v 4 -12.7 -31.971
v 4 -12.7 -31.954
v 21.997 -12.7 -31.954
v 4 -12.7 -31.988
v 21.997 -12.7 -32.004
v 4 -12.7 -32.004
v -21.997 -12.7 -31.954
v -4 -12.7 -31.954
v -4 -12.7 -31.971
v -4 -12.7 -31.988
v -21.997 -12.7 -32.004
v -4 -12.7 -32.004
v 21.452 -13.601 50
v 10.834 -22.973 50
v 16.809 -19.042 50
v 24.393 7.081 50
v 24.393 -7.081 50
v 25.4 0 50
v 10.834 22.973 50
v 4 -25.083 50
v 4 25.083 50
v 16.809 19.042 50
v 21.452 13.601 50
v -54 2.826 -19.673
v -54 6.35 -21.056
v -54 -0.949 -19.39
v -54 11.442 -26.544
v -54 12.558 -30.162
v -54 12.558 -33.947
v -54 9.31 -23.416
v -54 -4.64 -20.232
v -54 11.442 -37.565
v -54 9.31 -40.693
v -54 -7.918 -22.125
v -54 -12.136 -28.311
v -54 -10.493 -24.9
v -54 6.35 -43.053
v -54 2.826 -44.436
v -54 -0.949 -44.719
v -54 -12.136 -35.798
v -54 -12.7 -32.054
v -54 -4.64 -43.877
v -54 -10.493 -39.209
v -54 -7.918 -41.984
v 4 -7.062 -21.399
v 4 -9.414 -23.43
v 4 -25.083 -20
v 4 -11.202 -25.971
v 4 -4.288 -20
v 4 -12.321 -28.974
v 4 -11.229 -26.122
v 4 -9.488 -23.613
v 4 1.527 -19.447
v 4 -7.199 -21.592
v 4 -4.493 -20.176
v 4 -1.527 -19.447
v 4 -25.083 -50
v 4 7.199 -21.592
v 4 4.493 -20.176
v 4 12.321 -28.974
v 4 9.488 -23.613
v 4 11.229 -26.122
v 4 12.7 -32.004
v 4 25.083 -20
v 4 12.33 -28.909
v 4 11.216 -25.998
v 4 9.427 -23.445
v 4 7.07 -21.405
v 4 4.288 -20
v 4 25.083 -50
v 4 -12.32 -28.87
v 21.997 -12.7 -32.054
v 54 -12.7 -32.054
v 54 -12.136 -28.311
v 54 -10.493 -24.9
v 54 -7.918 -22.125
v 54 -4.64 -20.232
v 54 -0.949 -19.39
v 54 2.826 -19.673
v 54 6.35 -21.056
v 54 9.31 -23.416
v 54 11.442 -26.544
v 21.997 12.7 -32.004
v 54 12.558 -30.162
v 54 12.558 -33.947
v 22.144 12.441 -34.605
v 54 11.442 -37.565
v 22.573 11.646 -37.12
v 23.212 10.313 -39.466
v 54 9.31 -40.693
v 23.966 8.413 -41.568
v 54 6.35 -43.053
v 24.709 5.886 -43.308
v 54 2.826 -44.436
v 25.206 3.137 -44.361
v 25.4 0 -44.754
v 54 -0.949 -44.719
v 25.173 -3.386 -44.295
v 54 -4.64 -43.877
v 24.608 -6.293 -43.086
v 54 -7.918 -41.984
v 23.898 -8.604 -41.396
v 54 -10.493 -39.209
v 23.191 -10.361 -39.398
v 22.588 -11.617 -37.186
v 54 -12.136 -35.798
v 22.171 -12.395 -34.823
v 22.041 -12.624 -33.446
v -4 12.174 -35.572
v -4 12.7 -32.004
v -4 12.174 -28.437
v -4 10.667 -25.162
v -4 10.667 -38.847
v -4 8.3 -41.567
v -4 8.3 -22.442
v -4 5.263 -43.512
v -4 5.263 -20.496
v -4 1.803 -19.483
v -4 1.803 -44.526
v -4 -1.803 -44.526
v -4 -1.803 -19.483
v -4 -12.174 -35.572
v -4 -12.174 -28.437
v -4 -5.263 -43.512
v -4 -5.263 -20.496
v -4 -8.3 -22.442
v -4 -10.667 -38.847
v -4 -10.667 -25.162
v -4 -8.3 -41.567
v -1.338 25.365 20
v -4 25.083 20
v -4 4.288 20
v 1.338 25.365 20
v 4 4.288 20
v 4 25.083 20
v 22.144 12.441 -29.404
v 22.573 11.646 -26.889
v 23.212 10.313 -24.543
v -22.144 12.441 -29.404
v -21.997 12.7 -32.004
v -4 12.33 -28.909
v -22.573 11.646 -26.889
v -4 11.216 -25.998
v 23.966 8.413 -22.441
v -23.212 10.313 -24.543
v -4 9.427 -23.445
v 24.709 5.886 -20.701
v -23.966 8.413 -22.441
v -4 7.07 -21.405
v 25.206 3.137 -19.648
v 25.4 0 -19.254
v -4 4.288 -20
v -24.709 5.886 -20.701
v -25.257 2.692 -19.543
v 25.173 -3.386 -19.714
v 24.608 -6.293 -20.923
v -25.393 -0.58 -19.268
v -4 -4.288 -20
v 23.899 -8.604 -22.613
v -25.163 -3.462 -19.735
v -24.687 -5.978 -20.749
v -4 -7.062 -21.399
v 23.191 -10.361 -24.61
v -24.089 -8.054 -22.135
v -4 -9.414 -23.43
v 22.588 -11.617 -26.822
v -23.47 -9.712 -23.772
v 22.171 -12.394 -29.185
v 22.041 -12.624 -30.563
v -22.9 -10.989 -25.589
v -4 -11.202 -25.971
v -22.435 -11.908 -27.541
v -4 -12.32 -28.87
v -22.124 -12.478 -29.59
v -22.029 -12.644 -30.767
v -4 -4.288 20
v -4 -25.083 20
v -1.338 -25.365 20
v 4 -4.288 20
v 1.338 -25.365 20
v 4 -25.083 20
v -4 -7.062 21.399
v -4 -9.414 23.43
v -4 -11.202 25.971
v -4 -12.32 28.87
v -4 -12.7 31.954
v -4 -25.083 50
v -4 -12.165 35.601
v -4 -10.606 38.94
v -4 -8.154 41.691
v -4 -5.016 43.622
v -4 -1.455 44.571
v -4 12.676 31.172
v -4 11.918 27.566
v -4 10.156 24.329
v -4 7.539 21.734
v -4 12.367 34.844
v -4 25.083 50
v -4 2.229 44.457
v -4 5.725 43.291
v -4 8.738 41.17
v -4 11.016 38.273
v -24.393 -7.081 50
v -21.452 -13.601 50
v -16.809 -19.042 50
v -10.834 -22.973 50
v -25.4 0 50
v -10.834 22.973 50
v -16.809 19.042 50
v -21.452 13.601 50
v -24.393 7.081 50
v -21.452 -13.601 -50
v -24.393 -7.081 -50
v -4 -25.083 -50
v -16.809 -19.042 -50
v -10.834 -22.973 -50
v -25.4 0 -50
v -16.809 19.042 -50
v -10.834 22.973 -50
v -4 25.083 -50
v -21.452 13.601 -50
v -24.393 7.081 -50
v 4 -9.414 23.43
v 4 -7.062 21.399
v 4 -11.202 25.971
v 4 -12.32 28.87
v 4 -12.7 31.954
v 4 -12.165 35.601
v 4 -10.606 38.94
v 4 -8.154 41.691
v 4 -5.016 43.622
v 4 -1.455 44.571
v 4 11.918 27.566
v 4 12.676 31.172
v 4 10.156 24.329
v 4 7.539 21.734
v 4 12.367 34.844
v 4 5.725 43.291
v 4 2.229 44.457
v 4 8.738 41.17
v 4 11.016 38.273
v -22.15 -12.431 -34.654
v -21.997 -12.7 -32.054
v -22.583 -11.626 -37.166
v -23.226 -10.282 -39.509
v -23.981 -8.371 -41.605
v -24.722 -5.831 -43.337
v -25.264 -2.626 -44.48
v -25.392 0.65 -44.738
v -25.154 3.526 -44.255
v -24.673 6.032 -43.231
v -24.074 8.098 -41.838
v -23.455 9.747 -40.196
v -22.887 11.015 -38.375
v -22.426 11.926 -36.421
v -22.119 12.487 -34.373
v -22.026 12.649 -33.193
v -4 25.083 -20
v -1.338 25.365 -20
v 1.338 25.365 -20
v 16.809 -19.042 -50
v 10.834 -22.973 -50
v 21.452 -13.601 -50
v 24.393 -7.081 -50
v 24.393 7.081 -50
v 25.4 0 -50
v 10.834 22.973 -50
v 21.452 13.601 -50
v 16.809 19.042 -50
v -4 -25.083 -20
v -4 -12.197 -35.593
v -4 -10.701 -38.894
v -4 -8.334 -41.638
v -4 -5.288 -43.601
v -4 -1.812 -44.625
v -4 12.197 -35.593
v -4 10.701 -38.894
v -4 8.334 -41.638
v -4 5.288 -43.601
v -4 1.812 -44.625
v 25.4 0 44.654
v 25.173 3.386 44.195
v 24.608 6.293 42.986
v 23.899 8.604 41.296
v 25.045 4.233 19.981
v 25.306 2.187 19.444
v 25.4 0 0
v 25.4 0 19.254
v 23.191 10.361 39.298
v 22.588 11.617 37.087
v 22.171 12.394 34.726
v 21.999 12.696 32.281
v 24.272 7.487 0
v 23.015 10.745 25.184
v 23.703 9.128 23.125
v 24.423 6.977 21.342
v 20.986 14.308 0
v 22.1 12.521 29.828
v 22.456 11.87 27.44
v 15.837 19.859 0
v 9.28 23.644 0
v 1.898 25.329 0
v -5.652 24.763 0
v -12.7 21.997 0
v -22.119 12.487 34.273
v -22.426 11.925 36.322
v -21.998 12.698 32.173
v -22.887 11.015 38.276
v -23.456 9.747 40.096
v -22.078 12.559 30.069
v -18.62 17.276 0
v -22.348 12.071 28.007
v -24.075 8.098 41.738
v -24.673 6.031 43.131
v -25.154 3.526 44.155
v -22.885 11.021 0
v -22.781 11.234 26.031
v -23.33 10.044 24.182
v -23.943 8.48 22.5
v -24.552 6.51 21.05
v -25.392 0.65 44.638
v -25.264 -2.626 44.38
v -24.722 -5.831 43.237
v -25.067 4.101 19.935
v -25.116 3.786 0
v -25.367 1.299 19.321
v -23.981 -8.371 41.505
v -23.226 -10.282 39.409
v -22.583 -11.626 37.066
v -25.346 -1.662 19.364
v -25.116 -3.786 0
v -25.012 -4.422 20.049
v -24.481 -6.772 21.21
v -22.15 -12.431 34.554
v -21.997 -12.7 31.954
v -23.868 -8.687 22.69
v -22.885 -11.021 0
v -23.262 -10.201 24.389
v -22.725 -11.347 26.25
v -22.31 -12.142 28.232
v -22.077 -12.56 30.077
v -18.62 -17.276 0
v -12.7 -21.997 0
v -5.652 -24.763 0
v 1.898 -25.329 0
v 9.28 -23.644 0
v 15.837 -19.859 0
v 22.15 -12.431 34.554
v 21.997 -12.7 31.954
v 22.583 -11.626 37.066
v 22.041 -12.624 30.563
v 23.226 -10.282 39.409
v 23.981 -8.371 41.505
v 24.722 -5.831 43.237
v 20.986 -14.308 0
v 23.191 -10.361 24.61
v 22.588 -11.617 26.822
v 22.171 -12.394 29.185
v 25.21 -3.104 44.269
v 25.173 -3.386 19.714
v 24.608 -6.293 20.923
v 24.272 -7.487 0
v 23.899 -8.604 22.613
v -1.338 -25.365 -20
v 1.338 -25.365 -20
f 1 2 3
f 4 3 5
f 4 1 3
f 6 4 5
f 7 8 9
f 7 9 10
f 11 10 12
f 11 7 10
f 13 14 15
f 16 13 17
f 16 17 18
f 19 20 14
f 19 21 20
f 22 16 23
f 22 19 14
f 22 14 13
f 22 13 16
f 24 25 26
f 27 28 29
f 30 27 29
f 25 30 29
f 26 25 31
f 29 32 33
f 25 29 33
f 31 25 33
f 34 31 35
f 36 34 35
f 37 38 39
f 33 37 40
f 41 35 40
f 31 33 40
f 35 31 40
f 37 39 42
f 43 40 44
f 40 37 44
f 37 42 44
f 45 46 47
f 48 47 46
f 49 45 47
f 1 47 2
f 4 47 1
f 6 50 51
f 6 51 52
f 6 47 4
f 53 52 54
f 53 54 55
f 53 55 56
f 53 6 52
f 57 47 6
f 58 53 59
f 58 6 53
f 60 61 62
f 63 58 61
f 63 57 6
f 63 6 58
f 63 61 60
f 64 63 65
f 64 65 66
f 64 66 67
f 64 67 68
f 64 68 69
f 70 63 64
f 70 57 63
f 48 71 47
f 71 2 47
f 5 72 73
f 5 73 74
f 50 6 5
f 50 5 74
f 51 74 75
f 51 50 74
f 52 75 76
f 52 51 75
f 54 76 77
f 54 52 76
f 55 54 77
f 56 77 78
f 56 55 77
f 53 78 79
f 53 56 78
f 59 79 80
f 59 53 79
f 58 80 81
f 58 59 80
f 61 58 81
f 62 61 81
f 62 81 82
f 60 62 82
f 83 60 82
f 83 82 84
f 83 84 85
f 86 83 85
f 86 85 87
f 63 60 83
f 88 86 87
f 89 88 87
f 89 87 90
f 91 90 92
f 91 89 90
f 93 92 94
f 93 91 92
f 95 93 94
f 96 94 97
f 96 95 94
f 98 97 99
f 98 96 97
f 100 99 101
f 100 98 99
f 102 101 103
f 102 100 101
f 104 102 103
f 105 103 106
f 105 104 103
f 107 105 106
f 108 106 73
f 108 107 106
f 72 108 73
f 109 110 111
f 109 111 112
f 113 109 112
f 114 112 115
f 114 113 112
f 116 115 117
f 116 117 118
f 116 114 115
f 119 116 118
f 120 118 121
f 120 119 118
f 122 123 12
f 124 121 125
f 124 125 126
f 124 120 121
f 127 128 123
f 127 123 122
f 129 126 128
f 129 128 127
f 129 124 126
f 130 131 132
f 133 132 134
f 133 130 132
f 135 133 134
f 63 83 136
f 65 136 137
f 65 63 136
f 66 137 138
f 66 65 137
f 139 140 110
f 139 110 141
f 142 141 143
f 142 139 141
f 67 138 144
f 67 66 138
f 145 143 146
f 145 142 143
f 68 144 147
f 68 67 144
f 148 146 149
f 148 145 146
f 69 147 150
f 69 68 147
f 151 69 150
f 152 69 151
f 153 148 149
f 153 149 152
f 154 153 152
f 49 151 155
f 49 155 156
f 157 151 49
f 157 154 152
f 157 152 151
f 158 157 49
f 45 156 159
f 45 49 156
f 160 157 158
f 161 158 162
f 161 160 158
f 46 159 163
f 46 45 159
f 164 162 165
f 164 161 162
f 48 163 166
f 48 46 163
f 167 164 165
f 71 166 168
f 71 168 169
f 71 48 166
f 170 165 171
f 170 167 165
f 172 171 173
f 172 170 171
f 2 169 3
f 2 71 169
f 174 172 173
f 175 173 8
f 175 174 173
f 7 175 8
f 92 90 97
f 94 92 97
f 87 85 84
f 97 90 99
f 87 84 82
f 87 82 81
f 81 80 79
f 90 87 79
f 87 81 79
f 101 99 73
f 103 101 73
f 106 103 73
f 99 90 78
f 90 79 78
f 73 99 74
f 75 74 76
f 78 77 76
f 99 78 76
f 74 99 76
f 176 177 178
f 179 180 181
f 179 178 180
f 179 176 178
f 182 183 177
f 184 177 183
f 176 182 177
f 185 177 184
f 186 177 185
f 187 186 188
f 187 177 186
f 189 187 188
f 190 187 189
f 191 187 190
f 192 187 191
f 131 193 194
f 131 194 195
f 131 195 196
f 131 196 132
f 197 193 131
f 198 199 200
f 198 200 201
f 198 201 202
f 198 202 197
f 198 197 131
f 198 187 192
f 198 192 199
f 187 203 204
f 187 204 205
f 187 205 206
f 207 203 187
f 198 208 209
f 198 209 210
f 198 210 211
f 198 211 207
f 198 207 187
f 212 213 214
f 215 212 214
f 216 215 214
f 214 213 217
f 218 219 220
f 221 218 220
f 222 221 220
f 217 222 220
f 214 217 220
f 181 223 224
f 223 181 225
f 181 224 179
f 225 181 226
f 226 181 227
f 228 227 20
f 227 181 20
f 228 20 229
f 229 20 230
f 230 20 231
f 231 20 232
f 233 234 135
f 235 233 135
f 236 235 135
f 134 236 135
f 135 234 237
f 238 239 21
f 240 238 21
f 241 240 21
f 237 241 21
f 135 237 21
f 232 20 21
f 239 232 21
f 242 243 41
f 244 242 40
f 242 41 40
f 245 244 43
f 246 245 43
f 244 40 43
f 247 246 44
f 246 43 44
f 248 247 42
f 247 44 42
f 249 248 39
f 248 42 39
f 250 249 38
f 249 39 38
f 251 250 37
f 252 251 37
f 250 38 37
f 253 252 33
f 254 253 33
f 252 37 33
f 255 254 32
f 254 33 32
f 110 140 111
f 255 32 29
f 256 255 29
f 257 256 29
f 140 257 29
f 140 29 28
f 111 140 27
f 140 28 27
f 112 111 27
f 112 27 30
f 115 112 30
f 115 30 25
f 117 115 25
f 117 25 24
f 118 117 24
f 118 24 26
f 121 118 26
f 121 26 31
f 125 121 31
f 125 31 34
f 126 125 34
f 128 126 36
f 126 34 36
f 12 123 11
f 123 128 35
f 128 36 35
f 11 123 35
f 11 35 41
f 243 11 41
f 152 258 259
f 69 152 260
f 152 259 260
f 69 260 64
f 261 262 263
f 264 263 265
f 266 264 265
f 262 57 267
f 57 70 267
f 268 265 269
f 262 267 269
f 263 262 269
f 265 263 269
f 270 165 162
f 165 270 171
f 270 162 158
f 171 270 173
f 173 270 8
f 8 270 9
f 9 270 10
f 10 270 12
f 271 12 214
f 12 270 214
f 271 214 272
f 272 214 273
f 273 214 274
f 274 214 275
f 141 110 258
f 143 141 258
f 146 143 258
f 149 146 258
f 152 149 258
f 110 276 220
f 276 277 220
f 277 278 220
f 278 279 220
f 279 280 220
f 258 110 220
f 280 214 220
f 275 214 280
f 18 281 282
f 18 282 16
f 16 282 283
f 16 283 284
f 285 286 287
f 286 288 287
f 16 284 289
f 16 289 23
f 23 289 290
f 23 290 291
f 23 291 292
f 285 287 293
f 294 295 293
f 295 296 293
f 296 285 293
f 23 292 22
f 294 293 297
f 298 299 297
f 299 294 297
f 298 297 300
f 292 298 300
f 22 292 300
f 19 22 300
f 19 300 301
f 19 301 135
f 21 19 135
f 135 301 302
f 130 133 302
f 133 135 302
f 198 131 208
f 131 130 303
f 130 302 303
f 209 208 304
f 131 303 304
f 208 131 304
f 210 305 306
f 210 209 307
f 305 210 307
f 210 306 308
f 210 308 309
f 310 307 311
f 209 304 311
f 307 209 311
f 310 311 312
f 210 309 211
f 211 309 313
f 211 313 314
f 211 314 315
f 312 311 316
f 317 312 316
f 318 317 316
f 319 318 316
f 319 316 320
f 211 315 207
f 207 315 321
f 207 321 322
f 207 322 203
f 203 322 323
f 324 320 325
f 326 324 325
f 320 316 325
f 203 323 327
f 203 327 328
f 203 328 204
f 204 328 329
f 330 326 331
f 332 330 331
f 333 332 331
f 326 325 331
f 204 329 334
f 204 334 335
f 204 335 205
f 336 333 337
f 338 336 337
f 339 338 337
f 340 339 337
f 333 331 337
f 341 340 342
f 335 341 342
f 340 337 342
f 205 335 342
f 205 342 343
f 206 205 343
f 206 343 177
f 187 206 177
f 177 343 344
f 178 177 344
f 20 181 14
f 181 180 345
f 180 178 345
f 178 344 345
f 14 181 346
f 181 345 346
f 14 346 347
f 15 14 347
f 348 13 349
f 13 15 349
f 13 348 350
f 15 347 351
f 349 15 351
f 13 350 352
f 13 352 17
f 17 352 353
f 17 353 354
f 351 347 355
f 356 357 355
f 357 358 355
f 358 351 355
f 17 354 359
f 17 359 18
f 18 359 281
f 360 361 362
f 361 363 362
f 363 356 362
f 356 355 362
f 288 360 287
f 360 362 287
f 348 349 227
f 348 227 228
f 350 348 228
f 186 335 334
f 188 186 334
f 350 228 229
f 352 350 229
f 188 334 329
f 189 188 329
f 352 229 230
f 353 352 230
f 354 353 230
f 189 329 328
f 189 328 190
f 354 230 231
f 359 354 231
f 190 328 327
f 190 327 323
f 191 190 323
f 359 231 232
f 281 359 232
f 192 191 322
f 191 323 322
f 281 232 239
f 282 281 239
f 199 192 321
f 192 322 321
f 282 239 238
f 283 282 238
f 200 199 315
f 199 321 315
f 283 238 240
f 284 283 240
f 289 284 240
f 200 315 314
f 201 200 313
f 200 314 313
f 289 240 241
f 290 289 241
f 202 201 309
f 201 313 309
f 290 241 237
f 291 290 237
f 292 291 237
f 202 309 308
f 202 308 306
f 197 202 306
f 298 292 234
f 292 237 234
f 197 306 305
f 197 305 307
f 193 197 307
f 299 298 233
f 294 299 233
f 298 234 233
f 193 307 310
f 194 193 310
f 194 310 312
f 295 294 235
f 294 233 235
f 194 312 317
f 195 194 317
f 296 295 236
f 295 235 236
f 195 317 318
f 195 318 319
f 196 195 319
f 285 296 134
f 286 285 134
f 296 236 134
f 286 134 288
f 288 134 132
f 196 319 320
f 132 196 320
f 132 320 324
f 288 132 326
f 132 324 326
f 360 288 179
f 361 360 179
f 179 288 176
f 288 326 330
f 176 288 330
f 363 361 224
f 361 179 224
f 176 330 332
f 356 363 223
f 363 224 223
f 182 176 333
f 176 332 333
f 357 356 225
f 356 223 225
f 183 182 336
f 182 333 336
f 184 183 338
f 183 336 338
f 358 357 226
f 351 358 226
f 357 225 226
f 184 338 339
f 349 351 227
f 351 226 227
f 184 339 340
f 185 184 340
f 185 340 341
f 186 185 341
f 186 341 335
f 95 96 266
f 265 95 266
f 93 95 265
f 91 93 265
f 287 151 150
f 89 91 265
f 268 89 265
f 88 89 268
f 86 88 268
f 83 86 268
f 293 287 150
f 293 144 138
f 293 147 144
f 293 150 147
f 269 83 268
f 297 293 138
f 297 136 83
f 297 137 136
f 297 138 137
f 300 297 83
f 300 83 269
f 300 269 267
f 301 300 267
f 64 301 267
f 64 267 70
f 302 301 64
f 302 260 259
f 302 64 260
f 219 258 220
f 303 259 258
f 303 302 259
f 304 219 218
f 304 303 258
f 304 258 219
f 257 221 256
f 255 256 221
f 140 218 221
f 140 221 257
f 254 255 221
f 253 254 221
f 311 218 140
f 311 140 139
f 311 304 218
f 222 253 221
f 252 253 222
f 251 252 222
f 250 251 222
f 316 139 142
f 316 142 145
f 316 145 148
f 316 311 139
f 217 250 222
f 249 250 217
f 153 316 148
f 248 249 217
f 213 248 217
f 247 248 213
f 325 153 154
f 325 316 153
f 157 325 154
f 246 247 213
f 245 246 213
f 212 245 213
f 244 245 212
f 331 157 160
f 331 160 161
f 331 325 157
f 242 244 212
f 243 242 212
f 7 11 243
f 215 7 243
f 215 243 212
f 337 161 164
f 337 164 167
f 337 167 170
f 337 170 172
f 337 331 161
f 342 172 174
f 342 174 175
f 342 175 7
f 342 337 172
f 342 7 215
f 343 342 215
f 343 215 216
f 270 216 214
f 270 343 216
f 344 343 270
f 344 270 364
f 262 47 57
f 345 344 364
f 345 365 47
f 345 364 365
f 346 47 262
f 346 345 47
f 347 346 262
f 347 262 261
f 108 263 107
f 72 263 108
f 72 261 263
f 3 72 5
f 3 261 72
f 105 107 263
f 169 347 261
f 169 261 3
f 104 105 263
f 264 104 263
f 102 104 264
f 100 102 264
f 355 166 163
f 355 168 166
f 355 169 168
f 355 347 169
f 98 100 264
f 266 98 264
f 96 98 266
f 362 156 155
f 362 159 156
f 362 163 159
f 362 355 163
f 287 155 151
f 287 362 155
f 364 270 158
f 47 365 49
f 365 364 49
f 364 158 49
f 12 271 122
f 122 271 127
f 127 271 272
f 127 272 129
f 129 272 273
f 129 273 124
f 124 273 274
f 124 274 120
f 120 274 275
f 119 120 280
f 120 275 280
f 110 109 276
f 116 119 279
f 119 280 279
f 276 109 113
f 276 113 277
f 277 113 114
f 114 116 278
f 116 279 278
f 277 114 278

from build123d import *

# Parameters (mm, degrees)
SKETCH1_R           = 25.4
BOSS_EXTRUDE1_DEPTH = 50
SKETCH2_W           = 8
SKETCH2_H           = 56.617696499
CUT_EXTRUDE1_DEPTH  = 30
SKETCH3_R           = 12.7
CUT_EXTRUDE2_DEPTH  = 35
SKETCH4_R           = 12.7
BOSS_EXTRUDE2_DEPTH = 50
BOSS_EXTRUDE3_START = -50
SKETCH5_R           = 12.7
BOSS_EXTRUDE3_DEPTH = 50


with BuildPart() as part:
    # Sketch1 → Boss-Extrude1 (new body)
    with BuildSketch(Plane.XY):
        Circle(SKETCH1_R)
    extrude(amount=BOSS_EXTRUDE1_DEPTH)

    # Sketch2 → Cut-Extrude1 (cut)
    with BuildSketch(Plane.XY.offset(50)):
        with Locations((0, -1.452503267)):
            Rectangle(SKETCH2_W, SKETCH2_H)
    extrude(amount=-CUT_EXTRUDE1_DEPTH, mode=Mode.SUBTRACT)

    # Sketch3 → Cut-Extrude2 (cut, symmetric)
    with BuildSketch(Plane.ZY.offset(-4)):
        with Locations(Location((31.954368174, 0, 0), (0, 0, 270))):
            Circle(SKETCH3_R)
    extrude(amount=CUT_EXTRUDE2_DEPTH, both=True, mode=Mode.SUBTRACT)

    # Mirror1: part across plane


with BuildPart() as part_1:
    add(part.part)
    add(part.part.mirror(Plane.XY))

    # Sketch4 → Boss-Extrude2 (add)
    with BuildSketch(Plane.ZY.offset(-4)):
        with Locations(Location((-32.054446032, 0, 0), (0, 0, 270))):
            Circle(SKETCH4_R)
    extrude(amount=-BOSS_EXTRUDE2_DEPTH)

    # Sketch5 → Boss-Extrude3 (add)
    with BuildSketch(Plane(origin=(-4, 0, 0), x_dir=(0, 0, -1), z_dir=(1, 0, 0)).offset(BOSS_EXTRUDE3_START)):
        with Locations(Location((32.054446032, 0, 0), (0, 0, 270))):
            Circle(SKETCH5_R)
    extrude(amount=BOSS_EXTRUDE3_DEPTH)


solid = part_1.part
